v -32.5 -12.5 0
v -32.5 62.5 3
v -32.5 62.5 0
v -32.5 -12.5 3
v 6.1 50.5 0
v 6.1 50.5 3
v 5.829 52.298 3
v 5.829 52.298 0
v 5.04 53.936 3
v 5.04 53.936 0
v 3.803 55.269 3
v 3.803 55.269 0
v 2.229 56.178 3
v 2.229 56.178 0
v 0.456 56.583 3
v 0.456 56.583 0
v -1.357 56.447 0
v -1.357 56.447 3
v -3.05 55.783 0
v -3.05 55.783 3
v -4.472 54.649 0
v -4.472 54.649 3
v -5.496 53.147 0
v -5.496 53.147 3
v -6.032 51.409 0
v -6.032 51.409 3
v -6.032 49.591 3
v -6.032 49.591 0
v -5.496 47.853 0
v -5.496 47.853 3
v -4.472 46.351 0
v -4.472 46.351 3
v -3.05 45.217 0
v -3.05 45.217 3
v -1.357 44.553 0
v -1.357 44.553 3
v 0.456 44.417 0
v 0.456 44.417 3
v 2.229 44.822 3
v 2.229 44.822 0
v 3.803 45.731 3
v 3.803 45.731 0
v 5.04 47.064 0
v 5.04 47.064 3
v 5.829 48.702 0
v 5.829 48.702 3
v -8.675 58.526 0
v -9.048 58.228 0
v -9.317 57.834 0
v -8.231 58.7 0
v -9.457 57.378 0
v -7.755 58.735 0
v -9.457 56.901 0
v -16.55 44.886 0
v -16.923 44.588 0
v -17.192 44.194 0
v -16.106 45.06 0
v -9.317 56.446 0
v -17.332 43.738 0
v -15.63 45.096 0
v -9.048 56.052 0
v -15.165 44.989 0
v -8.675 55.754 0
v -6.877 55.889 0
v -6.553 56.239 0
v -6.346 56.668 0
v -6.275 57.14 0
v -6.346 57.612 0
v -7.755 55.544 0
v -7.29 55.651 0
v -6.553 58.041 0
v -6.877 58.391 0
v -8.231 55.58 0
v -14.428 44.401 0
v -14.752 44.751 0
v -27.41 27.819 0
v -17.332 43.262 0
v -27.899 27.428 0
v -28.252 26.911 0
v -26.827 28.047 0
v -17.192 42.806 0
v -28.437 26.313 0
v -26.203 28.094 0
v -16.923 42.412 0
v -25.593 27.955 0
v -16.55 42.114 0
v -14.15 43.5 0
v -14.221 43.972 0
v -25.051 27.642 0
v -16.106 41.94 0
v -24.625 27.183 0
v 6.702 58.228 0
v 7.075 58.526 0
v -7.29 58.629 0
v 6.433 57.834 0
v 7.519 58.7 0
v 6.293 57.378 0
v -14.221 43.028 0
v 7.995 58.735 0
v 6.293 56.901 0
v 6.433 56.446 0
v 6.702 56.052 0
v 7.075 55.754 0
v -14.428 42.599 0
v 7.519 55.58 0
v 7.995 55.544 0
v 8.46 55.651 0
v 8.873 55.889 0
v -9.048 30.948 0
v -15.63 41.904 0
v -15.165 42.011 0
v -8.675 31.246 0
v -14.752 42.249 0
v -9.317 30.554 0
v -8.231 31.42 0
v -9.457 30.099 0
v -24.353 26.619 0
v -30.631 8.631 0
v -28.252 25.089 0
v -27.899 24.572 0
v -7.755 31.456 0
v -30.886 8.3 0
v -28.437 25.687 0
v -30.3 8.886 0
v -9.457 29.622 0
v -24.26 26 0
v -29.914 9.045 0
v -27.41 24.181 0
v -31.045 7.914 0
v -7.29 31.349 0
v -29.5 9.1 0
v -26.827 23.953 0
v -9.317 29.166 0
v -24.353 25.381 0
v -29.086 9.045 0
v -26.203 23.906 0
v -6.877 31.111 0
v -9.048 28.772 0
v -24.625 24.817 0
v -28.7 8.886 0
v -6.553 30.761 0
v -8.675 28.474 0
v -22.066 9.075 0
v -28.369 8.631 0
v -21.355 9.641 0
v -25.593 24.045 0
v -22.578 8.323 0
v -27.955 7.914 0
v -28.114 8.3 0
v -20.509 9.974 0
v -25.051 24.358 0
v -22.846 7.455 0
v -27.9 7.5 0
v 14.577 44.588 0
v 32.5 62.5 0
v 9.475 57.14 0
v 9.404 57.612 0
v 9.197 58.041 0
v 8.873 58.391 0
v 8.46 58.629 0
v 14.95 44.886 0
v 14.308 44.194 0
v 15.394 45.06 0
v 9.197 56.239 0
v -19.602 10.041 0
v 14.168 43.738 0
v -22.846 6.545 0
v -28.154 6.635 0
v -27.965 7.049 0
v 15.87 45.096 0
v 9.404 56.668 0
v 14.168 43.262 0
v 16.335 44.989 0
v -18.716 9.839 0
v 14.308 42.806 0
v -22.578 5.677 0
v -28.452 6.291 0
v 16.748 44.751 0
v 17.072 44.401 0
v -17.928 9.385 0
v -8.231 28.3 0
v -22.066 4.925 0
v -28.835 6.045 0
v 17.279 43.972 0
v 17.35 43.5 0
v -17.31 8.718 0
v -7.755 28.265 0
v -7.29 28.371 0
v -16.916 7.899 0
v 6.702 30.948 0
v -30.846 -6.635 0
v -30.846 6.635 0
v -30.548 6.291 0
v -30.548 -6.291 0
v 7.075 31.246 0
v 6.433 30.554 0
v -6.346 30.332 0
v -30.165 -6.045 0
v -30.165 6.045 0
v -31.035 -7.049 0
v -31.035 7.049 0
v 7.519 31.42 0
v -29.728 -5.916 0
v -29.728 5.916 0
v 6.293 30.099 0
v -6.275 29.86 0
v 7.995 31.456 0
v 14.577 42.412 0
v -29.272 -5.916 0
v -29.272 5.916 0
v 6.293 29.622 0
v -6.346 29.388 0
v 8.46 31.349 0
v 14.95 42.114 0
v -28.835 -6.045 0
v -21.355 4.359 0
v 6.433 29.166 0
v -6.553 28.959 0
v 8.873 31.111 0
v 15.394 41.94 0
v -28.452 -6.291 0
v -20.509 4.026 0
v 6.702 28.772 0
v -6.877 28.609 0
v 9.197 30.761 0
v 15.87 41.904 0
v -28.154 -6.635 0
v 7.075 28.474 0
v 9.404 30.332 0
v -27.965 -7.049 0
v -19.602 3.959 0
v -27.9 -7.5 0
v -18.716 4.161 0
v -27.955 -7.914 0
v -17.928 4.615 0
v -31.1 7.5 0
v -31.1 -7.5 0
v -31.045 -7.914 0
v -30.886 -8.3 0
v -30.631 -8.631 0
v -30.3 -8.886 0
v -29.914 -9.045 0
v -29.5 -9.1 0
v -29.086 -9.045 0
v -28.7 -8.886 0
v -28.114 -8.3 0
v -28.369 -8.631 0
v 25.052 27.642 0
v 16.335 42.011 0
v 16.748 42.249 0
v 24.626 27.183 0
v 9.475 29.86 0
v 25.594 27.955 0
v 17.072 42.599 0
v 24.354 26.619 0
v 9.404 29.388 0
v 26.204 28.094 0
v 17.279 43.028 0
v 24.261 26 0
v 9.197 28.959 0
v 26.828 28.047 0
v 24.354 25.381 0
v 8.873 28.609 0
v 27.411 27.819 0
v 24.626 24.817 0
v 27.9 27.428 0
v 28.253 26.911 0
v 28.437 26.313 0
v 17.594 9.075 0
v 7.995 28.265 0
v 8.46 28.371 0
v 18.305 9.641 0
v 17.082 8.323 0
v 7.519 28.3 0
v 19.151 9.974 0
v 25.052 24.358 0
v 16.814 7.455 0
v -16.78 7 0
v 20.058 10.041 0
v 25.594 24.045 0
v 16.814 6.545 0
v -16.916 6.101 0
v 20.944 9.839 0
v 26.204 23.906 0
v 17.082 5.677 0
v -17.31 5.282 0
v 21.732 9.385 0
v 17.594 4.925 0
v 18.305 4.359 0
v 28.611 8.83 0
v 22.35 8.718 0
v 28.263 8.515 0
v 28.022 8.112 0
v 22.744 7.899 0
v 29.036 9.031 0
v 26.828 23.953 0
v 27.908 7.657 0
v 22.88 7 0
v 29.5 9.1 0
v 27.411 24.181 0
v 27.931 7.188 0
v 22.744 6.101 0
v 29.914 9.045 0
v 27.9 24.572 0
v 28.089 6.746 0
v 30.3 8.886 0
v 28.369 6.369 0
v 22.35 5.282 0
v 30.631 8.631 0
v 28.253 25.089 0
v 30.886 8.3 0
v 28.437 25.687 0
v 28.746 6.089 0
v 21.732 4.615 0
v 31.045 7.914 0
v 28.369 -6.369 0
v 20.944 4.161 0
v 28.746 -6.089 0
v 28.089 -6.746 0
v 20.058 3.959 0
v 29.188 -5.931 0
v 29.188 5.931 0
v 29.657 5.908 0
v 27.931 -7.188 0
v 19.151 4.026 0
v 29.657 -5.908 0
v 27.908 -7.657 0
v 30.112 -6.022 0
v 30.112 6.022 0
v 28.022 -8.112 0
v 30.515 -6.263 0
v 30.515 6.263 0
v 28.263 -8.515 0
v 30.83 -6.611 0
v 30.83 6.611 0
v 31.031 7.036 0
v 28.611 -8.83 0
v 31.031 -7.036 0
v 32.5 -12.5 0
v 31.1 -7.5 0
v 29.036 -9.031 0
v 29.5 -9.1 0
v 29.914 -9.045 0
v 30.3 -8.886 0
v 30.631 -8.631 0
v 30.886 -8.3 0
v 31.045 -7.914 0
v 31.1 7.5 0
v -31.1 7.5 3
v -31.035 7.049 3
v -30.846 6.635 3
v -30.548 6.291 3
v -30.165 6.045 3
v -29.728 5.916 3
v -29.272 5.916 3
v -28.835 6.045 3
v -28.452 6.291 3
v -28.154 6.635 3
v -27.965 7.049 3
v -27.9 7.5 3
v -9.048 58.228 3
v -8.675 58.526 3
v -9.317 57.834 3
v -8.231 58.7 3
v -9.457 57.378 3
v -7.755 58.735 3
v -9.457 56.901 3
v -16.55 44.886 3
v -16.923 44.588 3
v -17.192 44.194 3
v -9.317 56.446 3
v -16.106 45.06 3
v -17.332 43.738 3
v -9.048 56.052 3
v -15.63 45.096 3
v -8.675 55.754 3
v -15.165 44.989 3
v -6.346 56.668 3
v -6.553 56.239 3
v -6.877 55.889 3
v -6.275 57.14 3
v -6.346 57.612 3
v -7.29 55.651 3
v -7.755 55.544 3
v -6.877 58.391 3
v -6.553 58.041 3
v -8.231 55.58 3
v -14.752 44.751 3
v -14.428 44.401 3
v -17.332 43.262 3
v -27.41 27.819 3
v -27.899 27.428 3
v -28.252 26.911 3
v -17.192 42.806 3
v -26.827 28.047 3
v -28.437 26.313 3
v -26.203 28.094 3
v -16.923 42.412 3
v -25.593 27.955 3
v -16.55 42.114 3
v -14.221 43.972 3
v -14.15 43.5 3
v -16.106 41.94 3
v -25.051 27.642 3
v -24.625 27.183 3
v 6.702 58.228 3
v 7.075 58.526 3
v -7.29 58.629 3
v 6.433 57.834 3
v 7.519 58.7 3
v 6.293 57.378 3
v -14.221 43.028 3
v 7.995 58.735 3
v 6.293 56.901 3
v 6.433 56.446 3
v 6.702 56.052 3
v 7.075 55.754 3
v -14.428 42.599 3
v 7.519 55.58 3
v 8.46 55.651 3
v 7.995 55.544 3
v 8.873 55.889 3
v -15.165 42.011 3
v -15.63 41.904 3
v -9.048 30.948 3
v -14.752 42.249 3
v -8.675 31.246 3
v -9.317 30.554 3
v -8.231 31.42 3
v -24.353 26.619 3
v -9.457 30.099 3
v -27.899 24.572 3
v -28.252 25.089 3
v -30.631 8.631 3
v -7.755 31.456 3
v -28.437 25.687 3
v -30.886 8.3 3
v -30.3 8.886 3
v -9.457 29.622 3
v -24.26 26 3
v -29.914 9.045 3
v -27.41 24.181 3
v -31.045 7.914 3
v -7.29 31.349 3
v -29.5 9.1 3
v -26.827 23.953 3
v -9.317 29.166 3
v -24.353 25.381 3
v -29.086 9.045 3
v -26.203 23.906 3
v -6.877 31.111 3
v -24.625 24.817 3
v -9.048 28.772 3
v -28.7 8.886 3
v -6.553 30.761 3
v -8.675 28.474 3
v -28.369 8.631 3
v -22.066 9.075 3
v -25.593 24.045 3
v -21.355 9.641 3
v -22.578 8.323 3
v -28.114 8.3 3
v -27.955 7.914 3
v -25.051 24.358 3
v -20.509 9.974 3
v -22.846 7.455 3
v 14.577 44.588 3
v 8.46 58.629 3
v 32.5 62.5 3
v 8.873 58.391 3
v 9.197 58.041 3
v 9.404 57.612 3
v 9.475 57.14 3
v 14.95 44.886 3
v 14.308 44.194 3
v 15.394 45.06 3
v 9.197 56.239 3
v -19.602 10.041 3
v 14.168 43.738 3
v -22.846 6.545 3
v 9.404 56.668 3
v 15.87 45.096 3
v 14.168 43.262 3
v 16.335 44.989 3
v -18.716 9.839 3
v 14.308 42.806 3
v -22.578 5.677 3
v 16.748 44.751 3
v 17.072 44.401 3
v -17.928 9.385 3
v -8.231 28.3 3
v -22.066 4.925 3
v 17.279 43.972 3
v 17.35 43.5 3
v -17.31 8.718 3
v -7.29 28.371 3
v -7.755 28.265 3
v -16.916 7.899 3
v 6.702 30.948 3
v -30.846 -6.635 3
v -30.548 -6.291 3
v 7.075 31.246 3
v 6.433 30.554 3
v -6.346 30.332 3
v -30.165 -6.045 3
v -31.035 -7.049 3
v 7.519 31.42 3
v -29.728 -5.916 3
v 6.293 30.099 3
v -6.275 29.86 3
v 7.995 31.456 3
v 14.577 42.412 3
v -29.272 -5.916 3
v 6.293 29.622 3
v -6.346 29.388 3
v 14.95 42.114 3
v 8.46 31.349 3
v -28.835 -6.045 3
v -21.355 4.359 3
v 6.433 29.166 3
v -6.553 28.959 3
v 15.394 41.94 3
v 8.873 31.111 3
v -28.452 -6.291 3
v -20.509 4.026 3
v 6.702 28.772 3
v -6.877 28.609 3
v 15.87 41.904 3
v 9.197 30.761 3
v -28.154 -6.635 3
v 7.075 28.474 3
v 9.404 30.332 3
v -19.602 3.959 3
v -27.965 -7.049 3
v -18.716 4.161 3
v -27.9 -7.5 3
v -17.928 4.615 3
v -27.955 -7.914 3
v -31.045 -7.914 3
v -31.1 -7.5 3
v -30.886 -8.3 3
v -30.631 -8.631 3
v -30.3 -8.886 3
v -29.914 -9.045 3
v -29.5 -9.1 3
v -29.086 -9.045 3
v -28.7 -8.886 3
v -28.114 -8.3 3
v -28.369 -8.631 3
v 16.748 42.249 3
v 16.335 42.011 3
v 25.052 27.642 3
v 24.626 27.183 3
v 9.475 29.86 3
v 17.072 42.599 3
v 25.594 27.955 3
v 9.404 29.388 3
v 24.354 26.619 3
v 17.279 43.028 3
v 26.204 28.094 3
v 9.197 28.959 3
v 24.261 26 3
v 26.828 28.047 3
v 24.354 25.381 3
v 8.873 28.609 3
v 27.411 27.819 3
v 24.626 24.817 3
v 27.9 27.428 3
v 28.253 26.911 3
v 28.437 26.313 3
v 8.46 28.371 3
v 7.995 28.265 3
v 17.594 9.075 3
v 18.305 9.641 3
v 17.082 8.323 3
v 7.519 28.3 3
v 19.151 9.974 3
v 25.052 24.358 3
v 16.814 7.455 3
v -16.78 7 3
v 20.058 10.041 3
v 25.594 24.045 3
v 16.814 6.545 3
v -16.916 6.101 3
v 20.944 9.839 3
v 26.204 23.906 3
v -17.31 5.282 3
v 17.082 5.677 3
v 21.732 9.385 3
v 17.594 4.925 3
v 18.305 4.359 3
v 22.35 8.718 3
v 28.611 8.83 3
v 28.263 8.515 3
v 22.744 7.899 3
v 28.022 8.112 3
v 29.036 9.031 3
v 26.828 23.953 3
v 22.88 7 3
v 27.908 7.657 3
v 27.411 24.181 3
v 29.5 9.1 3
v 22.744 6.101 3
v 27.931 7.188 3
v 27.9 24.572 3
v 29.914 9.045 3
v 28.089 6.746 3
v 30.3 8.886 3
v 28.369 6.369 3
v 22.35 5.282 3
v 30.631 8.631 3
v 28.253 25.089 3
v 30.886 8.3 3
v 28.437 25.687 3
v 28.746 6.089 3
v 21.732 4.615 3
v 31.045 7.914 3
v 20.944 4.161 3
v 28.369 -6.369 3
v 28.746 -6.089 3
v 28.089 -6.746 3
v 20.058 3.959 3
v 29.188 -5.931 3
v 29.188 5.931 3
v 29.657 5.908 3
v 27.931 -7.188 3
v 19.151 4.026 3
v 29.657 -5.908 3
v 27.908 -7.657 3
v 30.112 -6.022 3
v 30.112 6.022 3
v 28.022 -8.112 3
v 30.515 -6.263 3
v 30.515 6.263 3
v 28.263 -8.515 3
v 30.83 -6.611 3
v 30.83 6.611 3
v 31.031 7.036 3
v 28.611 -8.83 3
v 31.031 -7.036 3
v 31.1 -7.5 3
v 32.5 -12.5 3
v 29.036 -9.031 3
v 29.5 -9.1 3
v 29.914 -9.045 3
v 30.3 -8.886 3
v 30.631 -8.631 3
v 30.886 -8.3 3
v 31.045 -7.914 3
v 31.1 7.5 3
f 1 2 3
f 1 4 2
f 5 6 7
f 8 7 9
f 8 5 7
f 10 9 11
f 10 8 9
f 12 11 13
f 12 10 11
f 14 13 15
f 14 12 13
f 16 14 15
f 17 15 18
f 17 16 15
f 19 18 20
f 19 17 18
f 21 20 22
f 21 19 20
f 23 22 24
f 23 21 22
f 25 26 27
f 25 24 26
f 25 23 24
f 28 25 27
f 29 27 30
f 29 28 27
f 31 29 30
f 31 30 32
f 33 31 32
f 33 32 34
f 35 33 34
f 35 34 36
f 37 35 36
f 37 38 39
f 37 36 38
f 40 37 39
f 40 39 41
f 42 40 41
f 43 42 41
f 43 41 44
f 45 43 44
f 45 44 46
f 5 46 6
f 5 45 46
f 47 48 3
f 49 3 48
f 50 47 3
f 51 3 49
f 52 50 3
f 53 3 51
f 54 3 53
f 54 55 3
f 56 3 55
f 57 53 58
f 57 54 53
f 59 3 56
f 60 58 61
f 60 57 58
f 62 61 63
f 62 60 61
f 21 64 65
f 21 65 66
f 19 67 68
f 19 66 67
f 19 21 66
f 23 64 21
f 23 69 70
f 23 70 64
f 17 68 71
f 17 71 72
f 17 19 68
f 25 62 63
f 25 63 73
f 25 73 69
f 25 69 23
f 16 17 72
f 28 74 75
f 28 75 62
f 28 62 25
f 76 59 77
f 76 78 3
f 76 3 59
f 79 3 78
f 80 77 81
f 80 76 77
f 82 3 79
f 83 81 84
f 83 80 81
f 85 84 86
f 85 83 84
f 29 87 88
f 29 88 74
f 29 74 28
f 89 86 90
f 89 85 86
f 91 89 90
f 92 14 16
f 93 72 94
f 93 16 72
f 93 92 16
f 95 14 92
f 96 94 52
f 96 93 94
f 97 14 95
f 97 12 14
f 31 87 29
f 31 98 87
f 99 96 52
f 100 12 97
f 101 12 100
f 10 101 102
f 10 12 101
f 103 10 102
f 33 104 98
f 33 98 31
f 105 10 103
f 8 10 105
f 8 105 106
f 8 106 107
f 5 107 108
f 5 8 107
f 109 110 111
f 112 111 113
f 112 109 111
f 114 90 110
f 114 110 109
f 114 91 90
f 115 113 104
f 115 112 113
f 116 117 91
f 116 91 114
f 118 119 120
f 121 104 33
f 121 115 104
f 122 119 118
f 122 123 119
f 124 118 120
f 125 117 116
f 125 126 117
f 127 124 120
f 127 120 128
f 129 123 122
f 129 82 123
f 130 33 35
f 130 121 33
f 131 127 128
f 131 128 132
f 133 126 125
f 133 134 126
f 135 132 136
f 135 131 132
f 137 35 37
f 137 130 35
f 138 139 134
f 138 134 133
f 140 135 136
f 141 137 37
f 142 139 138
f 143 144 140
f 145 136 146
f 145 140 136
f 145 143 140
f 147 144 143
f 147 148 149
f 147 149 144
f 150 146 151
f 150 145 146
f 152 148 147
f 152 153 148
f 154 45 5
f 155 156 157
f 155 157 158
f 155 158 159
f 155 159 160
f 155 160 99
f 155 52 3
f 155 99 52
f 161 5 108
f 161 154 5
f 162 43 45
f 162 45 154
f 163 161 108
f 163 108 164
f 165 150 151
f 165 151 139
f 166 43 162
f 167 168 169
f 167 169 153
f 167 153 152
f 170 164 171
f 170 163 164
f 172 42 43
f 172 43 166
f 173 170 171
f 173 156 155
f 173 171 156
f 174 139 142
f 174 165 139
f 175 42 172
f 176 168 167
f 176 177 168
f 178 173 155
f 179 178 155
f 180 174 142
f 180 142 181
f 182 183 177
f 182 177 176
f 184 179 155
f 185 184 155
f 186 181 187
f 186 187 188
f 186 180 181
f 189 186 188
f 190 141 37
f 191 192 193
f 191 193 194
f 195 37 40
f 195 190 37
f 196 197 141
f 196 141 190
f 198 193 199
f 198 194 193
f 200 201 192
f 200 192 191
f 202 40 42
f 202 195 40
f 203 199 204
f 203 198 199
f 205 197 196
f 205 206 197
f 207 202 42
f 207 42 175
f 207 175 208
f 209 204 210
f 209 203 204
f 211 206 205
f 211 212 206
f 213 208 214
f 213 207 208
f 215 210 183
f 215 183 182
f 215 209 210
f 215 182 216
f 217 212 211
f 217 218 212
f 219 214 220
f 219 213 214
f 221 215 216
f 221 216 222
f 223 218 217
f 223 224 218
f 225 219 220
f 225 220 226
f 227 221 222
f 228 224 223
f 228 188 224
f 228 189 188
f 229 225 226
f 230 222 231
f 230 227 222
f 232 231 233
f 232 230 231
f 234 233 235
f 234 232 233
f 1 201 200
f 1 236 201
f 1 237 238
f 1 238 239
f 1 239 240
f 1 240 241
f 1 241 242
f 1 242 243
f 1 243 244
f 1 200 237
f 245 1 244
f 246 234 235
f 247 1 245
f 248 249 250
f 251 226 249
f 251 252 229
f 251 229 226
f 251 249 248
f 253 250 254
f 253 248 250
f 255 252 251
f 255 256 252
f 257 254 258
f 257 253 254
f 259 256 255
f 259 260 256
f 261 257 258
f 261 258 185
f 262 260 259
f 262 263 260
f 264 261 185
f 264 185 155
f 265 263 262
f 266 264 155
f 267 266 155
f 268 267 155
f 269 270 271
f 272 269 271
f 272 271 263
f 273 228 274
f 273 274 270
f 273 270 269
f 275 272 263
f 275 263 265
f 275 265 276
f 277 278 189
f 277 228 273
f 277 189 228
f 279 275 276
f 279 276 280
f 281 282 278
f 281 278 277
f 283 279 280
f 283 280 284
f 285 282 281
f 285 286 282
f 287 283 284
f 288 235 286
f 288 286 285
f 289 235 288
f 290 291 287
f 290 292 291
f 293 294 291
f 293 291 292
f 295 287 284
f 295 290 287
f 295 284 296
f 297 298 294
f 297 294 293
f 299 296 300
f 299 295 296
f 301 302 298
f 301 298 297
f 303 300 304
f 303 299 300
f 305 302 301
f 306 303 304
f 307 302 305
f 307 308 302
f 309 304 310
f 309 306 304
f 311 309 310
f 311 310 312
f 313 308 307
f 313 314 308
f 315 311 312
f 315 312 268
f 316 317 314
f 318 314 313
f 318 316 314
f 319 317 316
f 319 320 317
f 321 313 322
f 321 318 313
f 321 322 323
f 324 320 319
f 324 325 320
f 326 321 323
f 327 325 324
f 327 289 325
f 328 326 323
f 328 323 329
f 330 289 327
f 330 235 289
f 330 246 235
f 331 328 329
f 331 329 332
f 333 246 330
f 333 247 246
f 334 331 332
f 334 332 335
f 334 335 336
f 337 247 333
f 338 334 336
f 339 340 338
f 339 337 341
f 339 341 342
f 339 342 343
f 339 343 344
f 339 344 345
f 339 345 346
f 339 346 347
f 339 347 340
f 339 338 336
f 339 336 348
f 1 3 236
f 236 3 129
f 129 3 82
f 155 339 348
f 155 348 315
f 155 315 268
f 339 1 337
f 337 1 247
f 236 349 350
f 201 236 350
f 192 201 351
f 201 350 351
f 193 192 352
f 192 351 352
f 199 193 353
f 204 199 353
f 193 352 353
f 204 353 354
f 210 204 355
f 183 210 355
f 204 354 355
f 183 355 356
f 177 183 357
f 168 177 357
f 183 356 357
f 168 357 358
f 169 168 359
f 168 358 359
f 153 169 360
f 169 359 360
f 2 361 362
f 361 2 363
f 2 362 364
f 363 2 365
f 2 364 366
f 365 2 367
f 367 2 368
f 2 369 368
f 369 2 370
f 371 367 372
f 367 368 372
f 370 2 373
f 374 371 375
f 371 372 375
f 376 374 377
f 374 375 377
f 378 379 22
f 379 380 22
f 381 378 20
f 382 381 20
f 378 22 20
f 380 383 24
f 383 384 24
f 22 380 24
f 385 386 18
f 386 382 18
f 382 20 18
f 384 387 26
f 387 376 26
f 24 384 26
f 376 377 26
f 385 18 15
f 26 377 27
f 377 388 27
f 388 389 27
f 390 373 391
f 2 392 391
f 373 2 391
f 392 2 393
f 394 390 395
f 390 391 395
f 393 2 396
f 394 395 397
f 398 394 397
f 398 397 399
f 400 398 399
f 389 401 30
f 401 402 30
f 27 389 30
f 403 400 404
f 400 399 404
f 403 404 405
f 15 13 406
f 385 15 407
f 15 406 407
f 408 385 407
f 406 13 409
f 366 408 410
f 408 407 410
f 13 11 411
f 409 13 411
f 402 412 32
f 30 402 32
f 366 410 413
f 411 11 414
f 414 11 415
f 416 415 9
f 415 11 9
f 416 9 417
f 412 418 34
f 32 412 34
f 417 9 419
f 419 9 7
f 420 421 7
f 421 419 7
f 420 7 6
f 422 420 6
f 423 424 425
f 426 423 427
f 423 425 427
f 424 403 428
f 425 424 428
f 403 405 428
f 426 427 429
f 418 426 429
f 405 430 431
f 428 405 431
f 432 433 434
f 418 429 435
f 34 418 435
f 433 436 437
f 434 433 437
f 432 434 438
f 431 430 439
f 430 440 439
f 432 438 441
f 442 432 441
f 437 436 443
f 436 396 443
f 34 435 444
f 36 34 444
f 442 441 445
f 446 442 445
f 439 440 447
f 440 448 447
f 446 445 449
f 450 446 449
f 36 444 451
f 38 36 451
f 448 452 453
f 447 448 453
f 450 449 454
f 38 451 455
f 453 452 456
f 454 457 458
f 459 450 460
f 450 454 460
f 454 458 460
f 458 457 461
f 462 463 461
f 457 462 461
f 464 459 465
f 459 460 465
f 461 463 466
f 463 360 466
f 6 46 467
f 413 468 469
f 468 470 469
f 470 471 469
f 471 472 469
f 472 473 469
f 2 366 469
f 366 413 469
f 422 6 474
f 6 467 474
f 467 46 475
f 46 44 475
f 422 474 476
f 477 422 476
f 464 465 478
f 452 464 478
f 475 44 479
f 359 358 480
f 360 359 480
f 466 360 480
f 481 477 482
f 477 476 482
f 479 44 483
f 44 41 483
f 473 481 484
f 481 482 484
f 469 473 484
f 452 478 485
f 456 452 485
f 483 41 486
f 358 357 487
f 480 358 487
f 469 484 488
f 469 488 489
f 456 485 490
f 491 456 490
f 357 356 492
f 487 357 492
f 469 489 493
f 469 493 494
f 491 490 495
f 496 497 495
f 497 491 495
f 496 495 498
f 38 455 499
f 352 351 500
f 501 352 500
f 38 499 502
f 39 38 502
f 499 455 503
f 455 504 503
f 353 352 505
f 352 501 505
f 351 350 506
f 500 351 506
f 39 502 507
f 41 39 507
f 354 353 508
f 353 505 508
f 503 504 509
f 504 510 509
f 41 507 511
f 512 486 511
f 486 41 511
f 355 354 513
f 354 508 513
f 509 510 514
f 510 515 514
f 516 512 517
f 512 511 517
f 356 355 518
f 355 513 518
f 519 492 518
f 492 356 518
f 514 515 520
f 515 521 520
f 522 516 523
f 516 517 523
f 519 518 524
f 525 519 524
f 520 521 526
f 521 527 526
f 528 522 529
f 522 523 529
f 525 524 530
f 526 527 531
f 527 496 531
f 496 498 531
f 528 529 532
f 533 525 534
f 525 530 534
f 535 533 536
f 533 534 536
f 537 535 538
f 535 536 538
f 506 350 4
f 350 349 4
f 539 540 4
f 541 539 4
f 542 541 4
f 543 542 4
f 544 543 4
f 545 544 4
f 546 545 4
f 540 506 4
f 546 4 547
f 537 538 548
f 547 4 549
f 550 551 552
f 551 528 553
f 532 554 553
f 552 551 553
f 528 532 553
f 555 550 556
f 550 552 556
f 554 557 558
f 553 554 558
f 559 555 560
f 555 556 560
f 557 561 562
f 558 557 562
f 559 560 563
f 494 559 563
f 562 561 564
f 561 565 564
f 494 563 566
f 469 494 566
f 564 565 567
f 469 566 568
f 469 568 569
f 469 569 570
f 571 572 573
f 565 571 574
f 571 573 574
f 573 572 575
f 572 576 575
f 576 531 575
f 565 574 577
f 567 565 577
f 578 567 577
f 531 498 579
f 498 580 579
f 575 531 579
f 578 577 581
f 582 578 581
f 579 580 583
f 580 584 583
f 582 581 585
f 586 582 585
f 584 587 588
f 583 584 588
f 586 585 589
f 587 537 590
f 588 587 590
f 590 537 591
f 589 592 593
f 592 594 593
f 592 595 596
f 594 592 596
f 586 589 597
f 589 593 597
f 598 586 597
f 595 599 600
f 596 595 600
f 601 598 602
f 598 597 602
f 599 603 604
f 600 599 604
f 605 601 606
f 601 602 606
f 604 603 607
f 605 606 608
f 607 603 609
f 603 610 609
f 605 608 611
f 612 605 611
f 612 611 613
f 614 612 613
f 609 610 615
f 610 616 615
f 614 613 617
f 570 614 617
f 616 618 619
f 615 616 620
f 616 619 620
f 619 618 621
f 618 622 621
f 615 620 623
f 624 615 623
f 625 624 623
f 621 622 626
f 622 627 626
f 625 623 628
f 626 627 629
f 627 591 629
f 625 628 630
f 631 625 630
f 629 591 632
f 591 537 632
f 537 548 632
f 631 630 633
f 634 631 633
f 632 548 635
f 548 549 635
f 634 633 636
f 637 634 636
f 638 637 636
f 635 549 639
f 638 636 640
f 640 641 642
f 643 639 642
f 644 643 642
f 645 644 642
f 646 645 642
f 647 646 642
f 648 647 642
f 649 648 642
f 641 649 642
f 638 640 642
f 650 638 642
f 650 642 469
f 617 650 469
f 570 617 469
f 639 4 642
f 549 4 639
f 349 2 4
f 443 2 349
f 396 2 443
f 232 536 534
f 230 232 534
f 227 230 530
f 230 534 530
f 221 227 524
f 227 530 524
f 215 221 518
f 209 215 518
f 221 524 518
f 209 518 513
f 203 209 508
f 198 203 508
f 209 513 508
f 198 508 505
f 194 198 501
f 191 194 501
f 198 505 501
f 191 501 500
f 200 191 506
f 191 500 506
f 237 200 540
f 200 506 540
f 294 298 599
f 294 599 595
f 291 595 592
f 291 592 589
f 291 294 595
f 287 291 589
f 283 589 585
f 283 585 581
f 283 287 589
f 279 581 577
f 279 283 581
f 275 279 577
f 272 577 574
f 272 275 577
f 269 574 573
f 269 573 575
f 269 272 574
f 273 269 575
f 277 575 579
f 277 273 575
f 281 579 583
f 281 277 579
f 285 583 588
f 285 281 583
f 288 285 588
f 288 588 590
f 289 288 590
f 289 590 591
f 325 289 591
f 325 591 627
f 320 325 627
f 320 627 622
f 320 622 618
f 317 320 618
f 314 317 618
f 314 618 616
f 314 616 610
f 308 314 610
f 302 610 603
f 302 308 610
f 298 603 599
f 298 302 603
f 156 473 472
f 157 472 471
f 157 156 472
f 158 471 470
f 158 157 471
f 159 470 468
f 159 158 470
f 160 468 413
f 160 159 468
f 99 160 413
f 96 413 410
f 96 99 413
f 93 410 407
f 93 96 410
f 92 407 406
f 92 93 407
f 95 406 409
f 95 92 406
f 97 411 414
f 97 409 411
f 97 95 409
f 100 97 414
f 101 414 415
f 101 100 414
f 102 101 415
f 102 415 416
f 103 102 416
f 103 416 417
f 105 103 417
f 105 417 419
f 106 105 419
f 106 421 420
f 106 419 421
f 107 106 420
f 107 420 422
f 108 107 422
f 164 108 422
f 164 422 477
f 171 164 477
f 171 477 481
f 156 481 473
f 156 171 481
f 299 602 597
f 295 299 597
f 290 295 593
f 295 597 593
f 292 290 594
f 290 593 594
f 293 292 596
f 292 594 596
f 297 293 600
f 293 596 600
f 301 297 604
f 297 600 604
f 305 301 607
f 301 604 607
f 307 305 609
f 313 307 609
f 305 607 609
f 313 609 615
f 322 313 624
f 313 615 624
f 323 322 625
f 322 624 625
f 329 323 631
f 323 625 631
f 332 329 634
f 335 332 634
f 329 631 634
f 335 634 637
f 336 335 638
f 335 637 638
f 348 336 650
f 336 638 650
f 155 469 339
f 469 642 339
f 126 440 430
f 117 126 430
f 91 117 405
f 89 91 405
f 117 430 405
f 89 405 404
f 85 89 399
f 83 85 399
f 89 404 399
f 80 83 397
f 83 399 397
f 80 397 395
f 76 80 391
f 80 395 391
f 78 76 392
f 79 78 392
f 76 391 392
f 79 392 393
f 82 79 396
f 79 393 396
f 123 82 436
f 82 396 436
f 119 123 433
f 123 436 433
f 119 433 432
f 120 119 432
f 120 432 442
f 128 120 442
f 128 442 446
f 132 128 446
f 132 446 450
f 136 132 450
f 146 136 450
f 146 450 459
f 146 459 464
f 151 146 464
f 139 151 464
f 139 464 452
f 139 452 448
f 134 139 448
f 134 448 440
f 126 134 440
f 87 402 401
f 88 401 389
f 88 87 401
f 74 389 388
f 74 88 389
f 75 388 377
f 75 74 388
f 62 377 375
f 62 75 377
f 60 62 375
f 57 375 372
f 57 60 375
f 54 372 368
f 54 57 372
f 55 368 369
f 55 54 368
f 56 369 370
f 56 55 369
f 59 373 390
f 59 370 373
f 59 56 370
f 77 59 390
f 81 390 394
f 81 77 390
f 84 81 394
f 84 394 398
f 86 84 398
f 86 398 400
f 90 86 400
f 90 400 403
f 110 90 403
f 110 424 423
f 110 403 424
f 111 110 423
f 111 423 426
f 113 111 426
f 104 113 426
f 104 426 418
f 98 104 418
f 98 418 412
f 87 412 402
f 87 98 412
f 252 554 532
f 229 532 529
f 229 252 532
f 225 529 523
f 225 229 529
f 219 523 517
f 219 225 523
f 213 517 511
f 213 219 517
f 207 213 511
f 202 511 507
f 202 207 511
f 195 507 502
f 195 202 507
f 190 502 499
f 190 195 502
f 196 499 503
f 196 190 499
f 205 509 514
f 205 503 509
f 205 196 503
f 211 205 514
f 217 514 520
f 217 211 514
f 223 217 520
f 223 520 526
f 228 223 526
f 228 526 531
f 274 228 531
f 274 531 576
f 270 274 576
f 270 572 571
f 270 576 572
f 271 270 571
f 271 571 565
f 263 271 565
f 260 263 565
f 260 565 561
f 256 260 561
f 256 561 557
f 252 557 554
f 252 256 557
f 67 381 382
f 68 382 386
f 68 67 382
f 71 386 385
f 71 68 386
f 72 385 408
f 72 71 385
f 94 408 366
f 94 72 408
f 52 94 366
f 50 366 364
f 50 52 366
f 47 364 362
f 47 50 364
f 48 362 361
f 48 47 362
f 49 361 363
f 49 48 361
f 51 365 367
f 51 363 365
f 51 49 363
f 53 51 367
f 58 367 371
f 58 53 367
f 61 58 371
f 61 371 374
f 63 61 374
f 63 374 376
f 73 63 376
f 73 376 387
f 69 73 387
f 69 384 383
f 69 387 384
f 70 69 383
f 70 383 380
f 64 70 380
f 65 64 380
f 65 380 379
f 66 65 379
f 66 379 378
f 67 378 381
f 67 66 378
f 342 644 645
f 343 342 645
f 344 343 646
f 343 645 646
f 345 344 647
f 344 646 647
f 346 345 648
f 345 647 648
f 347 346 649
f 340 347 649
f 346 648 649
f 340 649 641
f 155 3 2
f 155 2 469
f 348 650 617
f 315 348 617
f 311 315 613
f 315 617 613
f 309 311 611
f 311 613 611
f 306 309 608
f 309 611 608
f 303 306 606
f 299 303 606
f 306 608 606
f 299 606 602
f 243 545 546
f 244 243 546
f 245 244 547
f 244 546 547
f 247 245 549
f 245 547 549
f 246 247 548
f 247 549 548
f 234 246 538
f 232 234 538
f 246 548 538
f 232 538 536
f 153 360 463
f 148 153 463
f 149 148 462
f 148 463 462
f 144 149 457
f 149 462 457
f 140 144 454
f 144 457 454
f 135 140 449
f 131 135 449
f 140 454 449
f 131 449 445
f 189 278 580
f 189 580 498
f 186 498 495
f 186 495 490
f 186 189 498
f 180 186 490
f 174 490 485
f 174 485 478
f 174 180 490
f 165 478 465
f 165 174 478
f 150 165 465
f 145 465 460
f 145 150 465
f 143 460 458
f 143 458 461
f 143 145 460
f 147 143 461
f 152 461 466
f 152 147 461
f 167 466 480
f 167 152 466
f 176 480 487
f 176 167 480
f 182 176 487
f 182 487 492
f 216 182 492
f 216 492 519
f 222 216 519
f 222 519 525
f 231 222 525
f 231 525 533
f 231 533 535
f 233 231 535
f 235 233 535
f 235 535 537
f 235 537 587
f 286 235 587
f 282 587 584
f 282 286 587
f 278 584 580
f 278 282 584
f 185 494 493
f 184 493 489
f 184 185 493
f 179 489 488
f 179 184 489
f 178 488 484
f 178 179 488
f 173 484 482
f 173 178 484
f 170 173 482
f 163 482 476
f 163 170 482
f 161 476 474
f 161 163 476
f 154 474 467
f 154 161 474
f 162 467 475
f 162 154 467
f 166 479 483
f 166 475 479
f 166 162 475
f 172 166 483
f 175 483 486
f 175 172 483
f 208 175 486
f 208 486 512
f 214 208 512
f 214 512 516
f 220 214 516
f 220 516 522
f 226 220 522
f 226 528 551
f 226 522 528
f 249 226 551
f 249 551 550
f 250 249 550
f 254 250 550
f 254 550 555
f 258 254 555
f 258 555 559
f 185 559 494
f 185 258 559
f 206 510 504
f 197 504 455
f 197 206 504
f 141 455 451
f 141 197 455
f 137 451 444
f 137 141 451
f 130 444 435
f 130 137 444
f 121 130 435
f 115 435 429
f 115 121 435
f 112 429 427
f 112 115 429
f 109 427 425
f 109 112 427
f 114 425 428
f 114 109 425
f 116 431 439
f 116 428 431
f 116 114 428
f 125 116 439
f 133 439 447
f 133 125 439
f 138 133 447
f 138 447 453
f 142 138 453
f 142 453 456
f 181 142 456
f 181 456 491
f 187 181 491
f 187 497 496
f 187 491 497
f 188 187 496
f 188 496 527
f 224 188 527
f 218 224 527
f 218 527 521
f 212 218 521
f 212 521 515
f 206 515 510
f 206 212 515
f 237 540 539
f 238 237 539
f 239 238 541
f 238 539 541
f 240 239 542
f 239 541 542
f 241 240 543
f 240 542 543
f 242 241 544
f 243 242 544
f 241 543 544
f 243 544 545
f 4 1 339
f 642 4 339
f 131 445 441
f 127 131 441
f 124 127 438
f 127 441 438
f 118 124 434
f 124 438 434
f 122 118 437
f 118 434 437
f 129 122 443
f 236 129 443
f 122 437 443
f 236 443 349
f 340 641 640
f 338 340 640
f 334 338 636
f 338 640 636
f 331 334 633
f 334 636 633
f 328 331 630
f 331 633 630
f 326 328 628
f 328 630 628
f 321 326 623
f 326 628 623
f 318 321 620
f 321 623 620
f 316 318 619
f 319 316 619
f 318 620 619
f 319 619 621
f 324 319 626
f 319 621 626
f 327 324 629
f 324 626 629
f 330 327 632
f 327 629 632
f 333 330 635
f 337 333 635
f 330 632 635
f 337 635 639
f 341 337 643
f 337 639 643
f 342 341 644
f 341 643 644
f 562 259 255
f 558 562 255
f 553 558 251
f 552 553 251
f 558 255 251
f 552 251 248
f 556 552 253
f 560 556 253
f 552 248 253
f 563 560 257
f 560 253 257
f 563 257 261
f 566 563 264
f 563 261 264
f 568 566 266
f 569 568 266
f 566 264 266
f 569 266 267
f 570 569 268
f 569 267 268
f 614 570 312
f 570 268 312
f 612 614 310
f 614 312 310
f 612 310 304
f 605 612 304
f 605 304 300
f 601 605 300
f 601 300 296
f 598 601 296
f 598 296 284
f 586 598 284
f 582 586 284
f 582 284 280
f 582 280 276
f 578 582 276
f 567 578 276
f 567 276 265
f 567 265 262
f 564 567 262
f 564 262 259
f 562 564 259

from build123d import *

# Parameters (mm, degrees)
SKETCH_1_W          = 65
SKETCH_1_H          = 25
SKETCH_1_R          = 3.05
EXTRUDE_1_DEPTH     = 3
CUT_EXTRUDE_1_DEPTH = 4
SKETCH_3_W          = 65
SKETCH_3_H          = 3
EXTRUDE_2_DEPTH     = 50
SKETCH_4_R          = 1.6
SKETCH_4_R_2        = 6.1
CUT_EXTRUDE_4_DEPTH = 40
SKETCH_5_R          = 2.1
CUT_EXTRUDE_5_DEPTH = 10
SKETCH_6_R          = 2.1
CUT_EXTRUDE_6_DEPTH = 10


with BuildPart() as part:
    # ｽｹｯﾁ1 → ﾎﾞｽ - 押し出し1 (new body)
    with BuildSketch(Plane.XY):
        Rectangle(SKETCH_1_W, SKETCH_1_H)
        with Locations((-19.83, 7)):
            Circle(SKETCH_1_R, mode=Mode.SUBTRACT)
        with Locations((19.83, 7)):
            Circle(SKETCH_1_R, mode=Mode.SUBTRACT)
    extrude(amount=EXTRUDE_1_DEPTH)

    # ｽｹｯﾁ2 → ｶｯﾄ - 押し出し1 (cut, through all)
    with BuildSketch(Plane.XY.offset(3)):
        with BuildLine():
            ThreePointArc((-27.9, 7.5), (-28.36862915, 8.63137085), (-29.5, 9.1))
            Line((-29.5, 9.1), (-29.5, 7.5))
            Line((-29.5, 7.5), (-31.1, 7.5))
            ThreePointArc((-31.1, 7.5), (-29.5, 5.9), (-27.9, 7.5))
        make_face()
        with BuildLine():
            Line((-29.5, 7.5), (-29.5, 9.1))
            ThreePointArc((-29.5, 9.1), (-30.63137085, 8.63137085), (-31.1, 7.5))
            Line((-31.1, 7.5), (-29.5, 7.5))
        make_face()
        with BuildLine():
            ThreePointArc((-31.1, -7.5), (-30.63137085, -8.63137085), (-29.5, -9.1))
            Line((-29.5, -9.1), (-29.5, -7.5))
            Line((-29.5, -7.5), (-31.1, -7.5))
        make_face()
        with BuildLine():
            Line((-29.5, -7.5), (-29.5, -9.1))
            ThreePointArc((-29.5, -9.1), (-28.36862915, -8.63137085), (-27.9, -7.5))
            ThreePointArc((-27.9, -7.5), (-29.5, -5.9), (-31.1, -7.5))
            Line((-31.1, -7.5), (-29.5, -7.5))
        make_face()
        with BuildLine():
            ThreePointArc((31.1, 7.5), (30.63137085, 8.63137085), (29.5, 9.1))
            Line((29.5, 9.1), (29.5, 7.5))
            Line((29.5, 7.5), (31.1, 7.5))
        make_face()
        with BuildLine():
            Line((29.5, 7.5), (29.5, 9.1))
            ThreePointArc((29.5, 9.1), (28.36862915, 6.36862915), (31.1, 7.5))
            Line((31.1, 7.5), (29.5, 7.5))
        make_face()
        with BuildLine():
            ThreePointArc((31.1, -7.5), (28.36862915, -6.36862915), (29.5, -9.1))
            Line((29.5, -9.1), (29.5, -7.5))
            Line((29.5, -7.5), (31.1, -7.5))
        make_face()
        with BuildLine():
            Line((29.5, -7.5), (29.5, -9.1))
            ThreePointArc((29.5, -9.1), (30.63137085, -8.63137085), (31.1, -7.5))
            Line((31.1, -7.5), (29.5, -7.5))
        make_face()
    extrude(amount=-CUT_EXTRUDE_1_DEPTH, mode=Mode.SUBTRACT)

    # ｽｹｯﾁ3 → ﾎﾞｽ - 押し出し2 (add)
    with BuildSketch(Plane(origin=(0, 12.5, 0), x_dir=(1, 0, 0), z_dir=(0, 1, 0))):
        with Locations((0, -1.5)):
            Rectangle(SKETCH_3_W, SKETCH_3_H)
    extrude(amount=EXTRUDE_2_DEPTH)

    # ｽｹｯﾁ4 → ｶｯﾄ - 押し出し4 (cut)
    with BuildSketch(Plane.XY):
        with Locations((-7.875, 57.13990011)):
            Circle(SKETCH_4_R)
        with Locations((7.875, 57.13990011)):
            Circle(SKETCH_4_R)
        with Locations((15.75, 43.5)):
            Circle(SKETCH_4_R)
        with Locations((7.875, 29.86009989)):
            Circle(SKETCH_4_R)
        with Locations((-7.875, 29.86009989)):
            Circle(SKETCH_4_R)
        with Locations((-15.75, 43.5)):
            Circle(SKETCH_4_R)
        with Locations((0, 50.5)):
            Circle(SKETCH_4_R_2)
    extrude(amount=CUT_EXTRUDE_4_DEPTH, mode=Mode.SUBTRACT)

    # ｽｹｯﾁ5 → ｶｯﾄ - 押し出し5 (cut)
    with BuildSketch(Plane(origin=(0, 0, 0), x_dir=(-1, 0, 0), z_dir=(0, 0, -1))):
        with Locations((-26.360896025, 26)):
            Circle(SKETCH_5_R)
    extrude(amount=-CUT_EXTRUDE_5_DEPTH, mode=Mode.SUBTRACT)

    # ｽｹｯﾁ6 → ｶｯﾄ - 押し出し6 (cut)
    with BuildSketch(Plane.XY.offset(3)):
        with Locations((-26.36, 26)):
            Circle(SKETCH_6_R)
    extrude(amount=-CUT_EXTRUDE_6_DEPTH, mode=Mode.SUBTRACT)


solid = part.part
